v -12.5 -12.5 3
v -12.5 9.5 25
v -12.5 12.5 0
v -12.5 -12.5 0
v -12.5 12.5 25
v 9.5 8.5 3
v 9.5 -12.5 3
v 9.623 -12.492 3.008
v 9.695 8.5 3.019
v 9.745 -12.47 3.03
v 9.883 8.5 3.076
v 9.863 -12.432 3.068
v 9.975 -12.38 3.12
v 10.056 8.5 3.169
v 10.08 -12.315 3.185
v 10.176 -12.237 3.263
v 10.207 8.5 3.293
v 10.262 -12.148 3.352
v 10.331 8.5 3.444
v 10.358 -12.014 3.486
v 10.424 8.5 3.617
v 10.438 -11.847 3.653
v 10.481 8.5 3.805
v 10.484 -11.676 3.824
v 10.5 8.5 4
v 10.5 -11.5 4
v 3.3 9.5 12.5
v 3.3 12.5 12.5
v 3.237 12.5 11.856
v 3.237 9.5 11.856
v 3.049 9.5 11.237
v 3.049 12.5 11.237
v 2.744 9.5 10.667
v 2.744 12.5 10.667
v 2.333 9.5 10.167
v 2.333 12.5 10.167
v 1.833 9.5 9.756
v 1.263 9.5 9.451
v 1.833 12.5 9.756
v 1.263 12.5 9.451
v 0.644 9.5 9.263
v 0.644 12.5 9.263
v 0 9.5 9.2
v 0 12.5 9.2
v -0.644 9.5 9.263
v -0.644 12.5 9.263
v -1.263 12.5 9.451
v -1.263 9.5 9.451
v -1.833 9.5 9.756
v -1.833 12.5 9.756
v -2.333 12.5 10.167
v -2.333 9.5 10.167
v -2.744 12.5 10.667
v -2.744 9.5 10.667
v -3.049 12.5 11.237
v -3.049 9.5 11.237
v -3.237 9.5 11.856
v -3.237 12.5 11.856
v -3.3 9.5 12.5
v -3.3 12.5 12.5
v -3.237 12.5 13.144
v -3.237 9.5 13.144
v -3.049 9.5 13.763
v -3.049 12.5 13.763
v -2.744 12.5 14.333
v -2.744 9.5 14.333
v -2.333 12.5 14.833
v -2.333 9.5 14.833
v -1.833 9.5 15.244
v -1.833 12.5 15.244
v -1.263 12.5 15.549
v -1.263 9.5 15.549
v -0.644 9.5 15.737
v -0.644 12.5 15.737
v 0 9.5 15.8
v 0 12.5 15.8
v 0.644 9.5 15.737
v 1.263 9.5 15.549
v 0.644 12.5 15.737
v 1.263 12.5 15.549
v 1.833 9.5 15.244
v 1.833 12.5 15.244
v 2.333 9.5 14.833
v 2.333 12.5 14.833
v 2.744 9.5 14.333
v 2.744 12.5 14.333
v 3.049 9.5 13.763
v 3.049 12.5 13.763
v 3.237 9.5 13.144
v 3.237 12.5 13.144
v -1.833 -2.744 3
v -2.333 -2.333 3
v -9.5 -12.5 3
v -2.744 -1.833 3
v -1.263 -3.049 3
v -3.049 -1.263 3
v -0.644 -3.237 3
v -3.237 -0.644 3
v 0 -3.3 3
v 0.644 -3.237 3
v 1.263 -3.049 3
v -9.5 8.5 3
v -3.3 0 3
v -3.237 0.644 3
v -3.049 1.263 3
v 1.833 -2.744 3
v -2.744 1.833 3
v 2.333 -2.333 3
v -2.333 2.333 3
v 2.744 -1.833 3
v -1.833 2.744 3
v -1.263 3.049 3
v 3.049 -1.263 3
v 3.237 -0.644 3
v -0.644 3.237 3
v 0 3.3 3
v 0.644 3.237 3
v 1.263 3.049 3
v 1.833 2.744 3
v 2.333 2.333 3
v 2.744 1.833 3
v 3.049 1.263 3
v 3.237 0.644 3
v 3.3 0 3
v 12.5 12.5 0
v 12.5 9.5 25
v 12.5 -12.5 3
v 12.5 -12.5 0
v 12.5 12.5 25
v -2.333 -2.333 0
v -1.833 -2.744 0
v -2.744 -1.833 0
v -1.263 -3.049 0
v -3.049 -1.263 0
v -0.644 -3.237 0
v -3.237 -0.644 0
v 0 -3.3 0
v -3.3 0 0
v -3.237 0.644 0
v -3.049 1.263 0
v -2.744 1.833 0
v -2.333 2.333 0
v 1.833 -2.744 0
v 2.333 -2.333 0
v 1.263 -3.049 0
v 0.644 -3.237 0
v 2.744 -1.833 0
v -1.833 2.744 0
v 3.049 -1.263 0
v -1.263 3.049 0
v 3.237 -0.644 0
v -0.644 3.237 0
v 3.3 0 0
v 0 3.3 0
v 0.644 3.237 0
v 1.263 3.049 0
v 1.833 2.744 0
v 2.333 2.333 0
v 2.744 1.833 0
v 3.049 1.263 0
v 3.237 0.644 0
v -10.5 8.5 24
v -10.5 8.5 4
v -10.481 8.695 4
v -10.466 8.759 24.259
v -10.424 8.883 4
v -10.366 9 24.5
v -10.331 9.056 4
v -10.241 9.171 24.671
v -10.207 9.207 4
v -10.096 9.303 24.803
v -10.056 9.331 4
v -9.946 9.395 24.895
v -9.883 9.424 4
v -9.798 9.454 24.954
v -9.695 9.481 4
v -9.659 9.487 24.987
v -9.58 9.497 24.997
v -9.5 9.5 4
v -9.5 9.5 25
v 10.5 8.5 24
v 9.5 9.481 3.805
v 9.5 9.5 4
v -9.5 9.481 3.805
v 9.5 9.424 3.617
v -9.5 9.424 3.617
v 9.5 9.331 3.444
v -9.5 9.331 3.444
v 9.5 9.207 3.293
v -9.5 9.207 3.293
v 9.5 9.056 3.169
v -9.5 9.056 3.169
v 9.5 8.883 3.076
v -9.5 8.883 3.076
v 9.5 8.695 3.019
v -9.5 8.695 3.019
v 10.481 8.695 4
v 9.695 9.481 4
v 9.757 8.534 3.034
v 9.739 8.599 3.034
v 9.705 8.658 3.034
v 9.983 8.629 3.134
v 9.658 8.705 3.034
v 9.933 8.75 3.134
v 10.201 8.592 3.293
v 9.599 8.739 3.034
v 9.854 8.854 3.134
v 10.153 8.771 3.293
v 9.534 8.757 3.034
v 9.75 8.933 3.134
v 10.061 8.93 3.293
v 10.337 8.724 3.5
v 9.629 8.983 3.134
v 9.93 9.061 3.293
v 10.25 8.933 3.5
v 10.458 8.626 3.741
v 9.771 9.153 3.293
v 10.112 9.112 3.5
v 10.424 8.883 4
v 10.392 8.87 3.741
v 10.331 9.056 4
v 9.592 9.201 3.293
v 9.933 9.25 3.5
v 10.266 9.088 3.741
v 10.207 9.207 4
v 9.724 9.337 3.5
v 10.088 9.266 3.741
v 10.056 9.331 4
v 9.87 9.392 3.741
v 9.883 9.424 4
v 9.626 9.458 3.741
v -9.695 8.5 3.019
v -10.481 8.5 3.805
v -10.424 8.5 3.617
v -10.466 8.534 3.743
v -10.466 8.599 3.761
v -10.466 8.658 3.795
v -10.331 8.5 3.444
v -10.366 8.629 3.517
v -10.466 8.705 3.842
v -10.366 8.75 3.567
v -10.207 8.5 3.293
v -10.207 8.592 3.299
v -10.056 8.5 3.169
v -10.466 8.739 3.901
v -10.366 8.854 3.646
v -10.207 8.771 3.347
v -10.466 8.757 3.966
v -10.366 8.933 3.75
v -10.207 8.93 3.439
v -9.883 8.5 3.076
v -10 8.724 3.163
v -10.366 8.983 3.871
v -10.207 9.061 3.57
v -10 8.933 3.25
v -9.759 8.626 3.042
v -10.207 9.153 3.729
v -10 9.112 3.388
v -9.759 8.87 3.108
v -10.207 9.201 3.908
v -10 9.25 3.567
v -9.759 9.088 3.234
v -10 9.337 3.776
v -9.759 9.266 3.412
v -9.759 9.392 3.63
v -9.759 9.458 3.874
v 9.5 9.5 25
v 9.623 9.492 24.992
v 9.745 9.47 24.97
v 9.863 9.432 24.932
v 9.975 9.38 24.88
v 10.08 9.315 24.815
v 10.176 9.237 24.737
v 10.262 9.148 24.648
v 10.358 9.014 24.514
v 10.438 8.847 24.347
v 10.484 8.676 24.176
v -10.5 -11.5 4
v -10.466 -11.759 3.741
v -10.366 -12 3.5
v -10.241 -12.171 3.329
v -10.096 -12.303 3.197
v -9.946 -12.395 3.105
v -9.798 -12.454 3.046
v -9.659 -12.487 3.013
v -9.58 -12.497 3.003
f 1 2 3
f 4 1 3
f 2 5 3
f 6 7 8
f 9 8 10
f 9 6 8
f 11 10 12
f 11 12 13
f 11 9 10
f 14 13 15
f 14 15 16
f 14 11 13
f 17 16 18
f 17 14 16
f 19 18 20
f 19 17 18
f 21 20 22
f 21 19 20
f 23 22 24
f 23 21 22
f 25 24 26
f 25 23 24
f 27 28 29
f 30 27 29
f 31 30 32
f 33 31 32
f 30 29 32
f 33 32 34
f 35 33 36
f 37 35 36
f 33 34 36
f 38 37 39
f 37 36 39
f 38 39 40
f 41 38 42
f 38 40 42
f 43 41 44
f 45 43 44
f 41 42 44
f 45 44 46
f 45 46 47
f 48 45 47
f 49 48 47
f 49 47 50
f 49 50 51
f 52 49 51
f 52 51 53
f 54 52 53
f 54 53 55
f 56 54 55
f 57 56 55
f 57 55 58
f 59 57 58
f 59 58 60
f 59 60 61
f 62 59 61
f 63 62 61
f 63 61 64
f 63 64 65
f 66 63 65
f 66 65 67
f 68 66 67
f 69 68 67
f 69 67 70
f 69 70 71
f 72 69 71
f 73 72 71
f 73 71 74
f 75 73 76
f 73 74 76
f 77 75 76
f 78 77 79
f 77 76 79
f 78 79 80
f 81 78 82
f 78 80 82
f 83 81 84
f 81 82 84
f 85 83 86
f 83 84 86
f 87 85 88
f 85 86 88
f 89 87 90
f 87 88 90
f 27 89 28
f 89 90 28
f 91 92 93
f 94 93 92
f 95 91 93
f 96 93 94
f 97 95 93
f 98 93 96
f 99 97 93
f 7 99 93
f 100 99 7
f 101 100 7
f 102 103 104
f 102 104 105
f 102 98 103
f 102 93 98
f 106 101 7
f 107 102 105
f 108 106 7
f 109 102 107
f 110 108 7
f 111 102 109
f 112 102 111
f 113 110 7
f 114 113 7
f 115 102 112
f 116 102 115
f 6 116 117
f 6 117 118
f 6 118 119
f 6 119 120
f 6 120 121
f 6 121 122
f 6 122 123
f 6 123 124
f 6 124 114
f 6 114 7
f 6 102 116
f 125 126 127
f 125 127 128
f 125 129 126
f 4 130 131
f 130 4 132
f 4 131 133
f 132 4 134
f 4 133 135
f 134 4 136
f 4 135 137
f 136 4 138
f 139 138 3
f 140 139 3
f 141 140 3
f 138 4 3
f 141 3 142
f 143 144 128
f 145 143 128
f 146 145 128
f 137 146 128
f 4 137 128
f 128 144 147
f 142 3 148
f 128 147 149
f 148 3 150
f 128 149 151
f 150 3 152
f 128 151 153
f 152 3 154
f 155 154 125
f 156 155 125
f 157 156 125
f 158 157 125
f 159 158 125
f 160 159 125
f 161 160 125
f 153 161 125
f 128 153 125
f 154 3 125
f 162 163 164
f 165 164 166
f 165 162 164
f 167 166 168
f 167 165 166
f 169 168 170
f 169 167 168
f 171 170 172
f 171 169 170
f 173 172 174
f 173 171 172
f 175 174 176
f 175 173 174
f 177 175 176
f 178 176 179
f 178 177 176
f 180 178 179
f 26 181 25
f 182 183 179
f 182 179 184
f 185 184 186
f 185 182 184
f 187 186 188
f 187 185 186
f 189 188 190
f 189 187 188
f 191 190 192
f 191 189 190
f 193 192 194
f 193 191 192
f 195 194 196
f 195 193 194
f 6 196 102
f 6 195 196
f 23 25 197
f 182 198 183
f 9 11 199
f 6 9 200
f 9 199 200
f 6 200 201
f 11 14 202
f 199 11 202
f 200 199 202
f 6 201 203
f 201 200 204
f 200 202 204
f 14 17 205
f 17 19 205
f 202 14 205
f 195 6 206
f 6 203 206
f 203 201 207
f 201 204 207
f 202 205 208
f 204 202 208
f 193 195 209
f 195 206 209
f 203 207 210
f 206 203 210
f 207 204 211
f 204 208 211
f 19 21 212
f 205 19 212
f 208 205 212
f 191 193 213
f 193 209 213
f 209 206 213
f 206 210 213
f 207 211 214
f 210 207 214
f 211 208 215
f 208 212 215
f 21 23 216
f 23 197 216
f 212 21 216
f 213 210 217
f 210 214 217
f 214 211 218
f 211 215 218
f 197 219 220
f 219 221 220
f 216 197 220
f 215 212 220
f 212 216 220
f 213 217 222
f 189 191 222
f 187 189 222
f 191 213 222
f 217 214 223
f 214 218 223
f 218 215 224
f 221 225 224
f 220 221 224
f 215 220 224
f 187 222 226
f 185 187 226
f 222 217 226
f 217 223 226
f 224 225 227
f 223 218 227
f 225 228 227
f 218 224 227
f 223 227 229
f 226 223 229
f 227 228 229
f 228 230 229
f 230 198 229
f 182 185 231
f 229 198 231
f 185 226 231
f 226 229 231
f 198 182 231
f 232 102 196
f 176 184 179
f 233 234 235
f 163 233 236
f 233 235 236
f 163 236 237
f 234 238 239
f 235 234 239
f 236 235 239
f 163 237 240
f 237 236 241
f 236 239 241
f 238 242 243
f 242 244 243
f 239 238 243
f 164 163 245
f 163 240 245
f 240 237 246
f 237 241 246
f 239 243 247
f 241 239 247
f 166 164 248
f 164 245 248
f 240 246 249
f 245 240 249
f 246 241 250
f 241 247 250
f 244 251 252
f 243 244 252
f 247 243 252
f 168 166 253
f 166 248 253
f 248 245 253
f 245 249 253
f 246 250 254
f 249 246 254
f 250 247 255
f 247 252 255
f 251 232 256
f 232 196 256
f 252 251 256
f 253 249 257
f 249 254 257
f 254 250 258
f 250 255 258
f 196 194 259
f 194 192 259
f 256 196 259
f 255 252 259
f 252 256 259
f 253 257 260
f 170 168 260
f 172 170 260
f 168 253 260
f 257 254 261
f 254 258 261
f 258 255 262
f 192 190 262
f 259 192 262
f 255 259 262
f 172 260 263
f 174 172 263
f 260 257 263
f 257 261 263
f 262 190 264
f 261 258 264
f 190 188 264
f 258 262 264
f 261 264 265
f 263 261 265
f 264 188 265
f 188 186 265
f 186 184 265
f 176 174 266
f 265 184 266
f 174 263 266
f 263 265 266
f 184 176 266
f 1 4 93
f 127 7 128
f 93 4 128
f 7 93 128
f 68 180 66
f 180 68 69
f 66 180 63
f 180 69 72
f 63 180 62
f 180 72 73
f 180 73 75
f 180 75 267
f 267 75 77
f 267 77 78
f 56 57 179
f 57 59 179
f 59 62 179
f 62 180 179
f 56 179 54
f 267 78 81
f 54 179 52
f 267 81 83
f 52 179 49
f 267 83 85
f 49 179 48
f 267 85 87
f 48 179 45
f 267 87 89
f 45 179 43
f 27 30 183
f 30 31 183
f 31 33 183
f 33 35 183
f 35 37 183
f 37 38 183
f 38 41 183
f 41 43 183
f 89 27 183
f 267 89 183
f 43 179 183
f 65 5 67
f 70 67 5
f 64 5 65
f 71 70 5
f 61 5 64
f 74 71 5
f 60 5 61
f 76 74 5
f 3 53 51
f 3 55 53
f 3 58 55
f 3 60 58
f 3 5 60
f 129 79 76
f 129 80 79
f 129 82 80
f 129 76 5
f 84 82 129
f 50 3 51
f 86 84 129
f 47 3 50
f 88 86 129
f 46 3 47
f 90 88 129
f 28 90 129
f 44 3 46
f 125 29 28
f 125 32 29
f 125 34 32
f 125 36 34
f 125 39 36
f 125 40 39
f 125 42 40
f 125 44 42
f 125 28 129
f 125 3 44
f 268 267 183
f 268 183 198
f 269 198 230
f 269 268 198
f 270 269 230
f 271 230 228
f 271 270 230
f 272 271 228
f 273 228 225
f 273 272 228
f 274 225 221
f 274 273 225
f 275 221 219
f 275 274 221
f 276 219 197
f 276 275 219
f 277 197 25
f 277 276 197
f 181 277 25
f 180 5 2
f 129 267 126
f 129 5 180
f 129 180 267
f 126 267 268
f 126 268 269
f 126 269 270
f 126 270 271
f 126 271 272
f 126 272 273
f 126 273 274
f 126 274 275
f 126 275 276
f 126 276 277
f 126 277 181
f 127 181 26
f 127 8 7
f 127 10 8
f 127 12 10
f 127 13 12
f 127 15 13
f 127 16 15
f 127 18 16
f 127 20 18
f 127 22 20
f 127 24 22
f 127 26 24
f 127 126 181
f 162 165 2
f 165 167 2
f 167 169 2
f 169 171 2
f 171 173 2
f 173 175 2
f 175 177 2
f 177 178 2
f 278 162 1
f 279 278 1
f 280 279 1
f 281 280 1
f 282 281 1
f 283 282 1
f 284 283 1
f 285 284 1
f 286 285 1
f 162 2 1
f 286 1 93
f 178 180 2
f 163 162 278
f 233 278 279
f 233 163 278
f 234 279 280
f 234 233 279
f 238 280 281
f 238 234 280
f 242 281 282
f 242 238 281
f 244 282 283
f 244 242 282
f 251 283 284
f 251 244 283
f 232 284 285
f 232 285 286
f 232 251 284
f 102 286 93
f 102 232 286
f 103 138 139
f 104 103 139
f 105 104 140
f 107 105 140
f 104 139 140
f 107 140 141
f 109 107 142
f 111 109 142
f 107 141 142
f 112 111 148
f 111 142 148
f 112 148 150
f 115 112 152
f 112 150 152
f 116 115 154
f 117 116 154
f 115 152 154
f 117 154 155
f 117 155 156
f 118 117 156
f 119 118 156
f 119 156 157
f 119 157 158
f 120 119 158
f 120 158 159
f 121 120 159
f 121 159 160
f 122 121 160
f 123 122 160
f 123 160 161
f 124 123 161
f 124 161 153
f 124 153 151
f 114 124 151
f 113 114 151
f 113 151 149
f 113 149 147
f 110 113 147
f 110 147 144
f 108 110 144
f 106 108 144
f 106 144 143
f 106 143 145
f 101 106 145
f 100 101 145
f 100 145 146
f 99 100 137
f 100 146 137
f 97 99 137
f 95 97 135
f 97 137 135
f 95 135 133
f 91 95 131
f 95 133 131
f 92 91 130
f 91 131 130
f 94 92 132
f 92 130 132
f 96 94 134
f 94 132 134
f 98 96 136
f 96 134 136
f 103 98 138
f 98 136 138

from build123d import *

# Parameters (mm, degrees)
SKETCH1_W            = 25
SKETCH1_H            = 25
BOSS_EXTRUDE1_DEPTH  = 3
SKETCH2_W            = 25
SKETCH2_H            = 3
BOSS_EXTRUDE2_DEPTH  = 22
BOSS_EXTRUDE3_DEPTH  = 2
BOSS_EXTRUDE4_DEPTH  = 2
M6_CLEARANCE_HOLE1_D = 6.6
M6_CLEARANCE_HOLE2_D = 6.6
FILLET1_R            = 1


with BuildPart() as part:
    # Sketch1 → Boss-Extrude1 (new body)
    with BuildSketch(Plane.XY):
        Rectangle(SKETCH1_W, SKETCH1_H)
    extrude(amount=BOSS_EXTRUDE1_DEPTH)

    # Sketch2 → Boss-Extrude2 (add)
    with BuildSketch(Plane.XY.offset(3)):
        with Locations((0, 11)):
            Rectangle(SKETCH2_W, SKETCH2_H)
    extrude(amount=BOSS_EXTRUDE2_DEPTH)

    # Sketch3 → Boss-Extrude3 (add)
    with BuildSketch(Plane(origin=(12.5, 0, 0), x_dir=(0, 0, -1), z_dir=(1, 0, 0))):
        Polygon((-25, 9.5), (-3, -12.5), (-3, 9.5), align=None)
    extrude(amount=-BOSS_EXTRUDE3_DEPTH)

    # Sketch4 → Boss-Extrude4 (add)
    with BuildSketch(Plane.ZY.offset(12.5)):
        Polygon((3, -12.5), (3, 9.5), (25, 9.5), align=None)
    extrude(amount=-BOSS_EXTRUDE4_DEPTH)

    # M6 Clearance Hole1 (through all)
    with Locations(Plane(origin=(0, 9.5, 0), x_dir=(-1, 0, 0), z_dir=(0, -1, 0))):
        with Locations((0, -12.5)):
            Hole(M6_CLEARANCE_HOLE1_D / 2)

    # M6 Clearance Hole2 (through all)
    with Locations(Plane.XY.offset(3)):
        with Locations((0, 0)):
            Hole(M6_CLEARANCE_HOLE2_D / 2)

    # Fillet1
    fillet1_edges = [part.edges().sort_by_distance(p)[0] for p in [
        (10.5, 9.5, 14),
        (10.5, -1.5, 3),
        (0, 9.5, 3),
        (-10.5, -1.5, 3),
        (-10.5, 9.5, 14),
    ]]
    fillet(fillet1_edges, radius=FILLET1_R)


solid = part.part
